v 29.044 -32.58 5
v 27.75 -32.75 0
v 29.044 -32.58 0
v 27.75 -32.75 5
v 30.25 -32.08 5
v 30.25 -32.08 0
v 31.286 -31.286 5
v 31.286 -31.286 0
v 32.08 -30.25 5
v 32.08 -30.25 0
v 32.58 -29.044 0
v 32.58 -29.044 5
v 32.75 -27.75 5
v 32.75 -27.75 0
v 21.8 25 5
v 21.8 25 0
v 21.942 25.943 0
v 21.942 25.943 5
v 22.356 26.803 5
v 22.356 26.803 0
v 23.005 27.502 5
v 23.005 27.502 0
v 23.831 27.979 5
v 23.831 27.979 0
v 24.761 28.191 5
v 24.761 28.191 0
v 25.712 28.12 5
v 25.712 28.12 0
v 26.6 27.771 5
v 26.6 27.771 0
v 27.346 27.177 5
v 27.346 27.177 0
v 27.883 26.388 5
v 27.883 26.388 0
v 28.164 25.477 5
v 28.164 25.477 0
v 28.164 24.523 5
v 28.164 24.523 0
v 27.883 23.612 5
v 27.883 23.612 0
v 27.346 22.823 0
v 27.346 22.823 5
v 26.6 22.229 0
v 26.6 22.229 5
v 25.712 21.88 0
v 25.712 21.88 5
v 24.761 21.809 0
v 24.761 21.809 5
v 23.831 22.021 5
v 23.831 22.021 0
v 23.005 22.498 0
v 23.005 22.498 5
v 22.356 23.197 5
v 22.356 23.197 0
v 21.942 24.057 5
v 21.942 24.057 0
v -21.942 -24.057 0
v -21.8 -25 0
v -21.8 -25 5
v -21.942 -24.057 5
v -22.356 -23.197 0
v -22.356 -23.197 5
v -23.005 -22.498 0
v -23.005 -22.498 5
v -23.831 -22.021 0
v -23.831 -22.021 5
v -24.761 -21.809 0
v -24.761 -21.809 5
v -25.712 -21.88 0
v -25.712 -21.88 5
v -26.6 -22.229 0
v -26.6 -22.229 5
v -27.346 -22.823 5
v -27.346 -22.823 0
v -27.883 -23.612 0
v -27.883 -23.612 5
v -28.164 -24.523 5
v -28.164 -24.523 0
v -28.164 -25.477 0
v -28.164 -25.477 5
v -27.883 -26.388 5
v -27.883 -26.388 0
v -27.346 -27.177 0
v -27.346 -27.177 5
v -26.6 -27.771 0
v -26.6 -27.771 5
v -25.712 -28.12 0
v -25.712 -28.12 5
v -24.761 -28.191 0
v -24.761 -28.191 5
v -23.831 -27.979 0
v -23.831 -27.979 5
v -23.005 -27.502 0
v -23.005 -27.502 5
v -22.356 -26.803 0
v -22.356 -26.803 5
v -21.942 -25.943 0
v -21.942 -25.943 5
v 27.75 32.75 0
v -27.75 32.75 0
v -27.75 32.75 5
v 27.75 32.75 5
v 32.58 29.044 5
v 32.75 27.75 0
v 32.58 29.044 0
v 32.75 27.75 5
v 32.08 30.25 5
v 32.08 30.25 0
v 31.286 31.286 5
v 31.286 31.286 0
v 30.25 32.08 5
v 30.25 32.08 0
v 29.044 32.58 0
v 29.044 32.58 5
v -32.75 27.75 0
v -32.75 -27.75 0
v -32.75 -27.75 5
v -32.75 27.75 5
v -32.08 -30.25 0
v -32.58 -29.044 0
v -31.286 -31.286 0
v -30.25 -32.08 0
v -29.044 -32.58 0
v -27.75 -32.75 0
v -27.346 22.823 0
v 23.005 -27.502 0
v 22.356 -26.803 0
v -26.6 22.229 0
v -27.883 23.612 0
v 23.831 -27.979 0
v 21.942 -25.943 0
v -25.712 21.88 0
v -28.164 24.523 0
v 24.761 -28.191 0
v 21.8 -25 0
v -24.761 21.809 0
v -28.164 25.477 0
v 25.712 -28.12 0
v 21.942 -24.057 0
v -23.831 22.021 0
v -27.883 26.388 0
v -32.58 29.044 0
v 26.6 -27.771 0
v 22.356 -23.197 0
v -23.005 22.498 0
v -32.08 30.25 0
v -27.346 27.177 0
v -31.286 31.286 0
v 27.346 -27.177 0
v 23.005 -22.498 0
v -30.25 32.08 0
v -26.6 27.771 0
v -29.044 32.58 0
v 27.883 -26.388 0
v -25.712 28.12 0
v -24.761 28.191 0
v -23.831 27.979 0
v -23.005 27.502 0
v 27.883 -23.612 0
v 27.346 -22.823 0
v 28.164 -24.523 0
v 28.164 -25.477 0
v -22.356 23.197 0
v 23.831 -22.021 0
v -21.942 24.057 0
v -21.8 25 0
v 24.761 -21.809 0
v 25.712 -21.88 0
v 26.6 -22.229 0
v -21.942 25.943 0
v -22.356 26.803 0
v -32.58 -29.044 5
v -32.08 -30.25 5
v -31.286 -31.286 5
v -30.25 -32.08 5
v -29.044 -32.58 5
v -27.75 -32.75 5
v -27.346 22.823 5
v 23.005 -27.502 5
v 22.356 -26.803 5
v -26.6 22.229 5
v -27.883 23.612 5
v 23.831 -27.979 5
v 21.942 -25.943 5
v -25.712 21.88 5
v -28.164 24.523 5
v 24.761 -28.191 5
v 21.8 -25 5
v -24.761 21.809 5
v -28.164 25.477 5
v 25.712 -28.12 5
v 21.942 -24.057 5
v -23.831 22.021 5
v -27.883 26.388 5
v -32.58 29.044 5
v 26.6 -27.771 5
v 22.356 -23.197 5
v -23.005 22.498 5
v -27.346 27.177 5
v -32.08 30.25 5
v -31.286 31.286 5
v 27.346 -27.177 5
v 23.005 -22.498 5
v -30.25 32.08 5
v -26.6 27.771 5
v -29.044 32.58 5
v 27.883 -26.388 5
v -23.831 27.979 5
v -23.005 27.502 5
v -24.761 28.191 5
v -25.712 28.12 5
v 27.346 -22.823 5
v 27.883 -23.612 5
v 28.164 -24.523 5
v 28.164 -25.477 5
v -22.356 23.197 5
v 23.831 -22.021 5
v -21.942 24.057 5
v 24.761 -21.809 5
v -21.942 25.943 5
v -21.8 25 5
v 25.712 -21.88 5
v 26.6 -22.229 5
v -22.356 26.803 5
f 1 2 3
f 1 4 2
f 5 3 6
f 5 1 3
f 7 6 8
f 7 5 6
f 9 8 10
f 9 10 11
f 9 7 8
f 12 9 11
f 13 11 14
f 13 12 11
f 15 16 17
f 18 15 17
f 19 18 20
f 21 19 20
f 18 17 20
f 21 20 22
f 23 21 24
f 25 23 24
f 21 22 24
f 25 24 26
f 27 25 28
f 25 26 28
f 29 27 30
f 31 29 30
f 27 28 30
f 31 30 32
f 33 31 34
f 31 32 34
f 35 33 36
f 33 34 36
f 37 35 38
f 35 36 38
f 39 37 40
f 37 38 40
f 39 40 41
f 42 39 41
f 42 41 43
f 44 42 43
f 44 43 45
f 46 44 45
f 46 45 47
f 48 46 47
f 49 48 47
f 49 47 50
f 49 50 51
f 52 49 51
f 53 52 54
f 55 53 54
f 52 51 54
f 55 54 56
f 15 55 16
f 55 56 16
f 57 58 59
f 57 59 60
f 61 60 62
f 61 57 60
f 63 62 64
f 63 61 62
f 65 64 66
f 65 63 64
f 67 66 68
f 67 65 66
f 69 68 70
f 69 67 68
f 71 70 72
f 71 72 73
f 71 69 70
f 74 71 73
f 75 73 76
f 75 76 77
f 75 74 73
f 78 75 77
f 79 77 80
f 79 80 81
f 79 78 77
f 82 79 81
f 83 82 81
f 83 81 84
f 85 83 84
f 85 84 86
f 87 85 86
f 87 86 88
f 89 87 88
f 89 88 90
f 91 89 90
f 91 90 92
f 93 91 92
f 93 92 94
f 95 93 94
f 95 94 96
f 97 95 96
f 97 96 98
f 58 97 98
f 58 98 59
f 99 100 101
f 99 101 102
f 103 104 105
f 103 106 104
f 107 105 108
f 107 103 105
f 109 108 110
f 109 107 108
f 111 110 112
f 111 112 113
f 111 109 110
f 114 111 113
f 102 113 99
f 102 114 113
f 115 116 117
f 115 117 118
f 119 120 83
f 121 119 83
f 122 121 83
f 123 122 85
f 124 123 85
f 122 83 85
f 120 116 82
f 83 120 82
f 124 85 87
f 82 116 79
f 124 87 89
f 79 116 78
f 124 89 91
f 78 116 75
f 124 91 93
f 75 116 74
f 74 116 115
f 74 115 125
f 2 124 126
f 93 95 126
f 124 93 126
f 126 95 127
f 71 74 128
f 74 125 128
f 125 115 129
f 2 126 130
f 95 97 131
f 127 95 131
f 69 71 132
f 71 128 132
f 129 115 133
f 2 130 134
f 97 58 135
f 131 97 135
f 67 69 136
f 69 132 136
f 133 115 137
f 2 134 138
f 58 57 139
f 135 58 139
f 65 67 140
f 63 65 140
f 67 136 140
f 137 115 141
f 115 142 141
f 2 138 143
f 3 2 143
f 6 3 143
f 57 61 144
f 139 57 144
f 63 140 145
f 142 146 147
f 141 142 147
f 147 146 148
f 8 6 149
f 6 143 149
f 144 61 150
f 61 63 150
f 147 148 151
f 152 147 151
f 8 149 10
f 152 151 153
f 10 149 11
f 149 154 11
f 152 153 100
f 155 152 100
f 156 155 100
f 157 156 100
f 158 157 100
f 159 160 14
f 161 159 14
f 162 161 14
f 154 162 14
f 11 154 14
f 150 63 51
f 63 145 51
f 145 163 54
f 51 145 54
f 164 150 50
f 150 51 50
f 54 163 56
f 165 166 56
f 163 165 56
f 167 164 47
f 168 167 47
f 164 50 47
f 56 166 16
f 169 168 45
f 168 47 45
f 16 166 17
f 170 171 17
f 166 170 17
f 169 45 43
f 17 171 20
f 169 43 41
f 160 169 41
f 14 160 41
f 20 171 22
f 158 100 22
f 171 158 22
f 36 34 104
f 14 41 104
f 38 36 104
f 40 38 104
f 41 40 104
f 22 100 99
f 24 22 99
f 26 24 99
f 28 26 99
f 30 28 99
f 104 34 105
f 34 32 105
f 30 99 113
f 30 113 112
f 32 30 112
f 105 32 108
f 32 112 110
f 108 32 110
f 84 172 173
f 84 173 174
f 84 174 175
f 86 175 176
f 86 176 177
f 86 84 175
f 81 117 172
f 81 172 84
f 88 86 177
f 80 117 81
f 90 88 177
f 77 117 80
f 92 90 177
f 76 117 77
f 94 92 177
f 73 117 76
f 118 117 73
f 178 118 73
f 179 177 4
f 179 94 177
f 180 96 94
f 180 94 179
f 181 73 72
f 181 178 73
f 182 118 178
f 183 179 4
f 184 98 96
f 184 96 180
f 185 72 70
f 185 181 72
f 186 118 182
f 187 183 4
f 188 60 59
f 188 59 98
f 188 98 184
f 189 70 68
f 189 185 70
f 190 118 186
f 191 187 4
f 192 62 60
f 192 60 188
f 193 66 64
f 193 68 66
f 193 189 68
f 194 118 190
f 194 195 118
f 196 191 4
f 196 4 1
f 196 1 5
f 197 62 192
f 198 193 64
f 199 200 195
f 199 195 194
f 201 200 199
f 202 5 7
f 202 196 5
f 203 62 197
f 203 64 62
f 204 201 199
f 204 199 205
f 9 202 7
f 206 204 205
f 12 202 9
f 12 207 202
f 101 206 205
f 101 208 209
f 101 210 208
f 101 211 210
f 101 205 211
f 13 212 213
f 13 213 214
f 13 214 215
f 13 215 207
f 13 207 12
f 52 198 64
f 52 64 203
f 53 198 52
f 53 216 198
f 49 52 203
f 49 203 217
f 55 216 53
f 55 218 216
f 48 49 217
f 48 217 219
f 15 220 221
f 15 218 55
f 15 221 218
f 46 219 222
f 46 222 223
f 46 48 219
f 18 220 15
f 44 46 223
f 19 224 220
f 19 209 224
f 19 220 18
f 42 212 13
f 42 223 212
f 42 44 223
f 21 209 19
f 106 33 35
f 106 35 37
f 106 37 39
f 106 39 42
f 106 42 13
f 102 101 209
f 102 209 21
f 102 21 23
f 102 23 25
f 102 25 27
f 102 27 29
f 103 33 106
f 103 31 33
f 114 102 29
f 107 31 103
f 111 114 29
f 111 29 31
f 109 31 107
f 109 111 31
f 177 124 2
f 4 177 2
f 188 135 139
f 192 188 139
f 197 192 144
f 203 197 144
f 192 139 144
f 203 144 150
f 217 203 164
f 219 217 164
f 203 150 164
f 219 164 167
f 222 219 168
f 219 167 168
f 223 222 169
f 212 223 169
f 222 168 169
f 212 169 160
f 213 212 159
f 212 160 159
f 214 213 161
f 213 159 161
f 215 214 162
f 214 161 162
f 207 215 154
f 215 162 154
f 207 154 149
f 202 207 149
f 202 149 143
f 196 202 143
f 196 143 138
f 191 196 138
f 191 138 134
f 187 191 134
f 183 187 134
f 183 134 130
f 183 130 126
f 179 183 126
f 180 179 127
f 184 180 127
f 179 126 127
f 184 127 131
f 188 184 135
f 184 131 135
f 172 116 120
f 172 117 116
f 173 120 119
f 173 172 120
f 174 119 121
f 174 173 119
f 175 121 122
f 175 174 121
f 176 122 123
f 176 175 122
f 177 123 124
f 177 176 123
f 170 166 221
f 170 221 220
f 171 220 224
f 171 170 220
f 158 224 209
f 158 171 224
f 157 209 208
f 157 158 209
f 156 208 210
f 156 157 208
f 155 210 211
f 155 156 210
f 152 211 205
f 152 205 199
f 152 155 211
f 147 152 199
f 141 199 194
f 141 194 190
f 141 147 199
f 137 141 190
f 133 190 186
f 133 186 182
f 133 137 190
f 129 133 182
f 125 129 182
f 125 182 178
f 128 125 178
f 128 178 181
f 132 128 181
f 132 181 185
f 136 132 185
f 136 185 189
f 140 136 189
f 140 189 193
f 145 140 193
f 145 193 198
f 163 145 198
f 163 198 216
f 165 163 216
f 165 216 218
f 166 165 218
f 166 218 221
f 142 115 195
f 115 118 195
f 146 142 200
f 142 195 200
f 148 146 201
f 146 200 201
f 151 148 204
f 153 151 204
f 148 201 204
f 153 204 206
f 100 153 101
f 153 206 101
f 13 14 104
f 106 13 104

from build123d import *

# Parameters (mm, degrees)
SKETCH_1_W          = 65.5
SKETCH_1_H          = 65.5
EXTRUDE_1_DEPTH     = 5
FILLET_1_R          = 5
SKETCH_7_R          = 3.2
CUT_EXTRUDE_2_DEPTH = 5
CUT_EXTRUDE_START   = -15
SKETCH_3_R          = 3.2
CUT_EXTRUDE_3_DEPTH = 15
EXTRUDE_START       = -5
SKETCH_12_R         = 3.2
EXTRUDE_3_DEPTH     = 5


with BuildPart() as part:
    # 스케치1 → 보스-돌출1 (new body)
    with BuildSketch(Plane.XY):
        Rectangle(SKETCH_1_W, SKETCH_1_H)
    extrude(amount=EXTRUDE_1_DEPTH)

    # 필렛1
    fillet_1_edges = [part.edges().sort_by_distance(p)[0] for p in [
        (-32.75, -32.75, 2.5),
        (32.75, -32.75, 2.5),
        (32.75, 32.75, 2.5),
        (-32.75, 32.75, 2.5),
    ]]
    fillet(fillet_1_edges, radius=FILLET_1_R)

    # 스케치7 → 컷-돌출2 (cut)
    with BuildSketch(Plane(origin=(0, 0, 0), x_dir=(-1, 0, 0), z_dir=(0, 0, -1))):
        with Locations((-25, -25)):
            Circle(SKETCH_7_R)
        with Locations((-25, 25)):
            Circle(SKETCH_7_R)
    extrude(amount=-CUT_EXTRUDE_2_DEPTH, mode=Mode.SUBTRACT)

    # 스케치3 → 컷-돌출3 (cut)
    with BuildSketch(Plane.XY.offset(5).offset(CUT_EXTRUDE_START)):
        with Locations(Location((25, -25, 0), (0, 0, 180))):
            Circle(SKETCH_3_R)
        with Locations(Location((25, 25, 0), (0, 0, 180))):
            Circle(SKETCH_3_R)
        with Locations((25, 0)):
            Circle(SKETCH_3_R)
        with Locations((0, -25)):
            Circle(SKETCH_3_R)
        with Locations((0, 25)):
            Circle(SKETCH_3_R)
        Circle(SKETCH_3_R)
        with Locations((-25, -25)):
            Circle(SKETCH_3_R)
        with Locations((-25, 25)):
            Circle(SKETCH_3_R)
        with Locations((-25, 0)):
            Circle(SKETCH_3_R)
    extrude(amount=CUT_EXTRUDE_3_DEPTH, mode=Mode.SUBTRACT)

    # 스케치12 → 보스-돌출3 (add)
    with BuildSketch(Plane.XY.offset(5).offset(EXTRUDE_START)):
        with Locations((25, 0)):
            Circle(SKETCH_12_R)
        Circle(SKETCH_12_R)
        with Locations((0, -25)):
            Circle(SKETCH_12_R)
        with Locations((0, 25)):
            Circle(SKETCH_12_R)
        with Locations((-25, 0)):
            Circle(SKETCH_12_R)
    extrude(amount=EXTRUDE_3_DEPTH)


solid = part.part
